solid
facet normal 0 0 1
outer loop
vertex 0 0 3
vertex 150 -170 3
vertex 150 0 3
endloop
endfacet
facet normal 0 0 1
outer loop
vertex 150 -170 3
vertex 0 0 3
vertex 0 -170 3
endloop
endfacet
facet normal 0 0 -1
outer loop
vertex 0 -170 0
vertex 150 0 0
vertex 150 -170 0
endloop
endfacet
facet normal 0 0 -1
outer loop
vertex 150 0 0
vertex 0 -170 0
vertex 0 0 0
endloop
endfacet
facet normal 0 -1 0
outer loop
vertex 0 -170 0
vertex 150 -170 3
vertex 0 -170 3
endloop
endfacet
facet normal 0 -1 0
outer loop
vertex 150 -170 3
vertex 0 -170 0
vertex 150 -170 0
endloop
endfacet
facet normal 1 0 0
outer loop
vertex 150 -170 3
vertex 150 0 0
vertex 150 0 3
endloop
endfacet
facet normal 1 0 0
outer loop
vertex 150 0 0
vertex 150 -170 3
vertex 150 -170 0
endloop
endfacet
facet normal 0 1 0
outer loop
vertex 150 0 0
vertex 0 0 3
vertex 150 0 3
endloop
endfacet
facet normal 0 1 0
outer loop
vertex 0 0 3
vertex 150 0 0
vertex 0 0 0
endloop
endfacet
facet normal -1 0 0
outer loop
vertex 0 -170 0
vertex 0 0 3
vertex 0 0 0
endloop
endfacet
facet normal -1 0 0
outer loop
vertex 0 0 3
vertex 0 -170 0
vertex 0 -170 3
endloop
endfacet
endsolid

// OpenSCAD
//for apporopriate alignment of the grid
xoff = 0;
yoff = 28;
zoff = 2;
plat = 150;
plotXOff = 0;
plotYOff = -178.8;
scaleFac = 25.4;
t0 = "O";
t1 = "N";
t2 = "E";
t3 = "1";
f0 = "Letters/";
f1 = "Letters/";
f2 = "Letters/";
f3 = "Numbers/";
font = "_alpha.dxf";
braille = true;
//quadrant title offsets
qxoff = 40;
qyoff = 6;


//remove excess grid/plot
difference() {
	//align and union the grid and plot
	translate(v = [xoff,yoff,zoff]) { 
		union() {
			linear_extrude(file = "Grid/cleanGrid4.dxf", height = 3, center = false);
			if (braille) {
				translate(v=[0,-1*yoff,0]) linear_extrude(file = "Grid/gridNumQ4.dxf", height = 5, center = false);
			} else { 
				translate(v=[0,-1*yoff,0]) linear_extrude(file = "Grid/gridNumQ4_alpha.dxf", height = 5, center = false);
			}		
			translate(v=[plotXOff,plotYOff,0]){
				scale(v = [scaleFac,scaleFac,0]) linear_extrude(file = "Q4.dxf", height = 5, center = false);
			}
			
		}

	}
	
	//blocks to remove excess
	union() {
		translate(v=[-20,-170,0]) cube(size = [20,175,10], center=false);
		translate(v=[-5,0,0]) cube(size = [175,20,10], center=false);
	}
}

//grid platform
translate(v=[0,-1*(plat+20),0]) cube(size = [plat, plat+20,3], center = false);	
// title bar
first = 10;
translate(v=[first,-1*(plat+qyoff),zoff]) linear_extrude(file = str(f0,t0,font), height = 5 , center = false);
translate(v=[first+15,-1*(plat+qyoff),zoff]) linear_extrude(file = str(f1,t1,font), height = 5 , center = false);
translate(v=[first+30,-1*(plat+qyoff),zoff]) linear_extrude(file = str(f2,t2,font), height = 5 , center = false);
translate(v=[first+45,-1*(plat+qyoff),zoff]) linear_extrude(file = str(f3,t3,font), height = 5 , center = false);	
if (braille) {
	translate(v=[plat-qxoff,-1*(plat+qyoff),zoff]) linear_extrude(file = "Grid/four.dxf", height = 5, center = false);
} else {
	translate(v=[plat-qxoff,-1*(plat+qyoff),zoff]) linear_extrude(file = "Grid/four_alpha.dxf", height = 5, center = false);
}
